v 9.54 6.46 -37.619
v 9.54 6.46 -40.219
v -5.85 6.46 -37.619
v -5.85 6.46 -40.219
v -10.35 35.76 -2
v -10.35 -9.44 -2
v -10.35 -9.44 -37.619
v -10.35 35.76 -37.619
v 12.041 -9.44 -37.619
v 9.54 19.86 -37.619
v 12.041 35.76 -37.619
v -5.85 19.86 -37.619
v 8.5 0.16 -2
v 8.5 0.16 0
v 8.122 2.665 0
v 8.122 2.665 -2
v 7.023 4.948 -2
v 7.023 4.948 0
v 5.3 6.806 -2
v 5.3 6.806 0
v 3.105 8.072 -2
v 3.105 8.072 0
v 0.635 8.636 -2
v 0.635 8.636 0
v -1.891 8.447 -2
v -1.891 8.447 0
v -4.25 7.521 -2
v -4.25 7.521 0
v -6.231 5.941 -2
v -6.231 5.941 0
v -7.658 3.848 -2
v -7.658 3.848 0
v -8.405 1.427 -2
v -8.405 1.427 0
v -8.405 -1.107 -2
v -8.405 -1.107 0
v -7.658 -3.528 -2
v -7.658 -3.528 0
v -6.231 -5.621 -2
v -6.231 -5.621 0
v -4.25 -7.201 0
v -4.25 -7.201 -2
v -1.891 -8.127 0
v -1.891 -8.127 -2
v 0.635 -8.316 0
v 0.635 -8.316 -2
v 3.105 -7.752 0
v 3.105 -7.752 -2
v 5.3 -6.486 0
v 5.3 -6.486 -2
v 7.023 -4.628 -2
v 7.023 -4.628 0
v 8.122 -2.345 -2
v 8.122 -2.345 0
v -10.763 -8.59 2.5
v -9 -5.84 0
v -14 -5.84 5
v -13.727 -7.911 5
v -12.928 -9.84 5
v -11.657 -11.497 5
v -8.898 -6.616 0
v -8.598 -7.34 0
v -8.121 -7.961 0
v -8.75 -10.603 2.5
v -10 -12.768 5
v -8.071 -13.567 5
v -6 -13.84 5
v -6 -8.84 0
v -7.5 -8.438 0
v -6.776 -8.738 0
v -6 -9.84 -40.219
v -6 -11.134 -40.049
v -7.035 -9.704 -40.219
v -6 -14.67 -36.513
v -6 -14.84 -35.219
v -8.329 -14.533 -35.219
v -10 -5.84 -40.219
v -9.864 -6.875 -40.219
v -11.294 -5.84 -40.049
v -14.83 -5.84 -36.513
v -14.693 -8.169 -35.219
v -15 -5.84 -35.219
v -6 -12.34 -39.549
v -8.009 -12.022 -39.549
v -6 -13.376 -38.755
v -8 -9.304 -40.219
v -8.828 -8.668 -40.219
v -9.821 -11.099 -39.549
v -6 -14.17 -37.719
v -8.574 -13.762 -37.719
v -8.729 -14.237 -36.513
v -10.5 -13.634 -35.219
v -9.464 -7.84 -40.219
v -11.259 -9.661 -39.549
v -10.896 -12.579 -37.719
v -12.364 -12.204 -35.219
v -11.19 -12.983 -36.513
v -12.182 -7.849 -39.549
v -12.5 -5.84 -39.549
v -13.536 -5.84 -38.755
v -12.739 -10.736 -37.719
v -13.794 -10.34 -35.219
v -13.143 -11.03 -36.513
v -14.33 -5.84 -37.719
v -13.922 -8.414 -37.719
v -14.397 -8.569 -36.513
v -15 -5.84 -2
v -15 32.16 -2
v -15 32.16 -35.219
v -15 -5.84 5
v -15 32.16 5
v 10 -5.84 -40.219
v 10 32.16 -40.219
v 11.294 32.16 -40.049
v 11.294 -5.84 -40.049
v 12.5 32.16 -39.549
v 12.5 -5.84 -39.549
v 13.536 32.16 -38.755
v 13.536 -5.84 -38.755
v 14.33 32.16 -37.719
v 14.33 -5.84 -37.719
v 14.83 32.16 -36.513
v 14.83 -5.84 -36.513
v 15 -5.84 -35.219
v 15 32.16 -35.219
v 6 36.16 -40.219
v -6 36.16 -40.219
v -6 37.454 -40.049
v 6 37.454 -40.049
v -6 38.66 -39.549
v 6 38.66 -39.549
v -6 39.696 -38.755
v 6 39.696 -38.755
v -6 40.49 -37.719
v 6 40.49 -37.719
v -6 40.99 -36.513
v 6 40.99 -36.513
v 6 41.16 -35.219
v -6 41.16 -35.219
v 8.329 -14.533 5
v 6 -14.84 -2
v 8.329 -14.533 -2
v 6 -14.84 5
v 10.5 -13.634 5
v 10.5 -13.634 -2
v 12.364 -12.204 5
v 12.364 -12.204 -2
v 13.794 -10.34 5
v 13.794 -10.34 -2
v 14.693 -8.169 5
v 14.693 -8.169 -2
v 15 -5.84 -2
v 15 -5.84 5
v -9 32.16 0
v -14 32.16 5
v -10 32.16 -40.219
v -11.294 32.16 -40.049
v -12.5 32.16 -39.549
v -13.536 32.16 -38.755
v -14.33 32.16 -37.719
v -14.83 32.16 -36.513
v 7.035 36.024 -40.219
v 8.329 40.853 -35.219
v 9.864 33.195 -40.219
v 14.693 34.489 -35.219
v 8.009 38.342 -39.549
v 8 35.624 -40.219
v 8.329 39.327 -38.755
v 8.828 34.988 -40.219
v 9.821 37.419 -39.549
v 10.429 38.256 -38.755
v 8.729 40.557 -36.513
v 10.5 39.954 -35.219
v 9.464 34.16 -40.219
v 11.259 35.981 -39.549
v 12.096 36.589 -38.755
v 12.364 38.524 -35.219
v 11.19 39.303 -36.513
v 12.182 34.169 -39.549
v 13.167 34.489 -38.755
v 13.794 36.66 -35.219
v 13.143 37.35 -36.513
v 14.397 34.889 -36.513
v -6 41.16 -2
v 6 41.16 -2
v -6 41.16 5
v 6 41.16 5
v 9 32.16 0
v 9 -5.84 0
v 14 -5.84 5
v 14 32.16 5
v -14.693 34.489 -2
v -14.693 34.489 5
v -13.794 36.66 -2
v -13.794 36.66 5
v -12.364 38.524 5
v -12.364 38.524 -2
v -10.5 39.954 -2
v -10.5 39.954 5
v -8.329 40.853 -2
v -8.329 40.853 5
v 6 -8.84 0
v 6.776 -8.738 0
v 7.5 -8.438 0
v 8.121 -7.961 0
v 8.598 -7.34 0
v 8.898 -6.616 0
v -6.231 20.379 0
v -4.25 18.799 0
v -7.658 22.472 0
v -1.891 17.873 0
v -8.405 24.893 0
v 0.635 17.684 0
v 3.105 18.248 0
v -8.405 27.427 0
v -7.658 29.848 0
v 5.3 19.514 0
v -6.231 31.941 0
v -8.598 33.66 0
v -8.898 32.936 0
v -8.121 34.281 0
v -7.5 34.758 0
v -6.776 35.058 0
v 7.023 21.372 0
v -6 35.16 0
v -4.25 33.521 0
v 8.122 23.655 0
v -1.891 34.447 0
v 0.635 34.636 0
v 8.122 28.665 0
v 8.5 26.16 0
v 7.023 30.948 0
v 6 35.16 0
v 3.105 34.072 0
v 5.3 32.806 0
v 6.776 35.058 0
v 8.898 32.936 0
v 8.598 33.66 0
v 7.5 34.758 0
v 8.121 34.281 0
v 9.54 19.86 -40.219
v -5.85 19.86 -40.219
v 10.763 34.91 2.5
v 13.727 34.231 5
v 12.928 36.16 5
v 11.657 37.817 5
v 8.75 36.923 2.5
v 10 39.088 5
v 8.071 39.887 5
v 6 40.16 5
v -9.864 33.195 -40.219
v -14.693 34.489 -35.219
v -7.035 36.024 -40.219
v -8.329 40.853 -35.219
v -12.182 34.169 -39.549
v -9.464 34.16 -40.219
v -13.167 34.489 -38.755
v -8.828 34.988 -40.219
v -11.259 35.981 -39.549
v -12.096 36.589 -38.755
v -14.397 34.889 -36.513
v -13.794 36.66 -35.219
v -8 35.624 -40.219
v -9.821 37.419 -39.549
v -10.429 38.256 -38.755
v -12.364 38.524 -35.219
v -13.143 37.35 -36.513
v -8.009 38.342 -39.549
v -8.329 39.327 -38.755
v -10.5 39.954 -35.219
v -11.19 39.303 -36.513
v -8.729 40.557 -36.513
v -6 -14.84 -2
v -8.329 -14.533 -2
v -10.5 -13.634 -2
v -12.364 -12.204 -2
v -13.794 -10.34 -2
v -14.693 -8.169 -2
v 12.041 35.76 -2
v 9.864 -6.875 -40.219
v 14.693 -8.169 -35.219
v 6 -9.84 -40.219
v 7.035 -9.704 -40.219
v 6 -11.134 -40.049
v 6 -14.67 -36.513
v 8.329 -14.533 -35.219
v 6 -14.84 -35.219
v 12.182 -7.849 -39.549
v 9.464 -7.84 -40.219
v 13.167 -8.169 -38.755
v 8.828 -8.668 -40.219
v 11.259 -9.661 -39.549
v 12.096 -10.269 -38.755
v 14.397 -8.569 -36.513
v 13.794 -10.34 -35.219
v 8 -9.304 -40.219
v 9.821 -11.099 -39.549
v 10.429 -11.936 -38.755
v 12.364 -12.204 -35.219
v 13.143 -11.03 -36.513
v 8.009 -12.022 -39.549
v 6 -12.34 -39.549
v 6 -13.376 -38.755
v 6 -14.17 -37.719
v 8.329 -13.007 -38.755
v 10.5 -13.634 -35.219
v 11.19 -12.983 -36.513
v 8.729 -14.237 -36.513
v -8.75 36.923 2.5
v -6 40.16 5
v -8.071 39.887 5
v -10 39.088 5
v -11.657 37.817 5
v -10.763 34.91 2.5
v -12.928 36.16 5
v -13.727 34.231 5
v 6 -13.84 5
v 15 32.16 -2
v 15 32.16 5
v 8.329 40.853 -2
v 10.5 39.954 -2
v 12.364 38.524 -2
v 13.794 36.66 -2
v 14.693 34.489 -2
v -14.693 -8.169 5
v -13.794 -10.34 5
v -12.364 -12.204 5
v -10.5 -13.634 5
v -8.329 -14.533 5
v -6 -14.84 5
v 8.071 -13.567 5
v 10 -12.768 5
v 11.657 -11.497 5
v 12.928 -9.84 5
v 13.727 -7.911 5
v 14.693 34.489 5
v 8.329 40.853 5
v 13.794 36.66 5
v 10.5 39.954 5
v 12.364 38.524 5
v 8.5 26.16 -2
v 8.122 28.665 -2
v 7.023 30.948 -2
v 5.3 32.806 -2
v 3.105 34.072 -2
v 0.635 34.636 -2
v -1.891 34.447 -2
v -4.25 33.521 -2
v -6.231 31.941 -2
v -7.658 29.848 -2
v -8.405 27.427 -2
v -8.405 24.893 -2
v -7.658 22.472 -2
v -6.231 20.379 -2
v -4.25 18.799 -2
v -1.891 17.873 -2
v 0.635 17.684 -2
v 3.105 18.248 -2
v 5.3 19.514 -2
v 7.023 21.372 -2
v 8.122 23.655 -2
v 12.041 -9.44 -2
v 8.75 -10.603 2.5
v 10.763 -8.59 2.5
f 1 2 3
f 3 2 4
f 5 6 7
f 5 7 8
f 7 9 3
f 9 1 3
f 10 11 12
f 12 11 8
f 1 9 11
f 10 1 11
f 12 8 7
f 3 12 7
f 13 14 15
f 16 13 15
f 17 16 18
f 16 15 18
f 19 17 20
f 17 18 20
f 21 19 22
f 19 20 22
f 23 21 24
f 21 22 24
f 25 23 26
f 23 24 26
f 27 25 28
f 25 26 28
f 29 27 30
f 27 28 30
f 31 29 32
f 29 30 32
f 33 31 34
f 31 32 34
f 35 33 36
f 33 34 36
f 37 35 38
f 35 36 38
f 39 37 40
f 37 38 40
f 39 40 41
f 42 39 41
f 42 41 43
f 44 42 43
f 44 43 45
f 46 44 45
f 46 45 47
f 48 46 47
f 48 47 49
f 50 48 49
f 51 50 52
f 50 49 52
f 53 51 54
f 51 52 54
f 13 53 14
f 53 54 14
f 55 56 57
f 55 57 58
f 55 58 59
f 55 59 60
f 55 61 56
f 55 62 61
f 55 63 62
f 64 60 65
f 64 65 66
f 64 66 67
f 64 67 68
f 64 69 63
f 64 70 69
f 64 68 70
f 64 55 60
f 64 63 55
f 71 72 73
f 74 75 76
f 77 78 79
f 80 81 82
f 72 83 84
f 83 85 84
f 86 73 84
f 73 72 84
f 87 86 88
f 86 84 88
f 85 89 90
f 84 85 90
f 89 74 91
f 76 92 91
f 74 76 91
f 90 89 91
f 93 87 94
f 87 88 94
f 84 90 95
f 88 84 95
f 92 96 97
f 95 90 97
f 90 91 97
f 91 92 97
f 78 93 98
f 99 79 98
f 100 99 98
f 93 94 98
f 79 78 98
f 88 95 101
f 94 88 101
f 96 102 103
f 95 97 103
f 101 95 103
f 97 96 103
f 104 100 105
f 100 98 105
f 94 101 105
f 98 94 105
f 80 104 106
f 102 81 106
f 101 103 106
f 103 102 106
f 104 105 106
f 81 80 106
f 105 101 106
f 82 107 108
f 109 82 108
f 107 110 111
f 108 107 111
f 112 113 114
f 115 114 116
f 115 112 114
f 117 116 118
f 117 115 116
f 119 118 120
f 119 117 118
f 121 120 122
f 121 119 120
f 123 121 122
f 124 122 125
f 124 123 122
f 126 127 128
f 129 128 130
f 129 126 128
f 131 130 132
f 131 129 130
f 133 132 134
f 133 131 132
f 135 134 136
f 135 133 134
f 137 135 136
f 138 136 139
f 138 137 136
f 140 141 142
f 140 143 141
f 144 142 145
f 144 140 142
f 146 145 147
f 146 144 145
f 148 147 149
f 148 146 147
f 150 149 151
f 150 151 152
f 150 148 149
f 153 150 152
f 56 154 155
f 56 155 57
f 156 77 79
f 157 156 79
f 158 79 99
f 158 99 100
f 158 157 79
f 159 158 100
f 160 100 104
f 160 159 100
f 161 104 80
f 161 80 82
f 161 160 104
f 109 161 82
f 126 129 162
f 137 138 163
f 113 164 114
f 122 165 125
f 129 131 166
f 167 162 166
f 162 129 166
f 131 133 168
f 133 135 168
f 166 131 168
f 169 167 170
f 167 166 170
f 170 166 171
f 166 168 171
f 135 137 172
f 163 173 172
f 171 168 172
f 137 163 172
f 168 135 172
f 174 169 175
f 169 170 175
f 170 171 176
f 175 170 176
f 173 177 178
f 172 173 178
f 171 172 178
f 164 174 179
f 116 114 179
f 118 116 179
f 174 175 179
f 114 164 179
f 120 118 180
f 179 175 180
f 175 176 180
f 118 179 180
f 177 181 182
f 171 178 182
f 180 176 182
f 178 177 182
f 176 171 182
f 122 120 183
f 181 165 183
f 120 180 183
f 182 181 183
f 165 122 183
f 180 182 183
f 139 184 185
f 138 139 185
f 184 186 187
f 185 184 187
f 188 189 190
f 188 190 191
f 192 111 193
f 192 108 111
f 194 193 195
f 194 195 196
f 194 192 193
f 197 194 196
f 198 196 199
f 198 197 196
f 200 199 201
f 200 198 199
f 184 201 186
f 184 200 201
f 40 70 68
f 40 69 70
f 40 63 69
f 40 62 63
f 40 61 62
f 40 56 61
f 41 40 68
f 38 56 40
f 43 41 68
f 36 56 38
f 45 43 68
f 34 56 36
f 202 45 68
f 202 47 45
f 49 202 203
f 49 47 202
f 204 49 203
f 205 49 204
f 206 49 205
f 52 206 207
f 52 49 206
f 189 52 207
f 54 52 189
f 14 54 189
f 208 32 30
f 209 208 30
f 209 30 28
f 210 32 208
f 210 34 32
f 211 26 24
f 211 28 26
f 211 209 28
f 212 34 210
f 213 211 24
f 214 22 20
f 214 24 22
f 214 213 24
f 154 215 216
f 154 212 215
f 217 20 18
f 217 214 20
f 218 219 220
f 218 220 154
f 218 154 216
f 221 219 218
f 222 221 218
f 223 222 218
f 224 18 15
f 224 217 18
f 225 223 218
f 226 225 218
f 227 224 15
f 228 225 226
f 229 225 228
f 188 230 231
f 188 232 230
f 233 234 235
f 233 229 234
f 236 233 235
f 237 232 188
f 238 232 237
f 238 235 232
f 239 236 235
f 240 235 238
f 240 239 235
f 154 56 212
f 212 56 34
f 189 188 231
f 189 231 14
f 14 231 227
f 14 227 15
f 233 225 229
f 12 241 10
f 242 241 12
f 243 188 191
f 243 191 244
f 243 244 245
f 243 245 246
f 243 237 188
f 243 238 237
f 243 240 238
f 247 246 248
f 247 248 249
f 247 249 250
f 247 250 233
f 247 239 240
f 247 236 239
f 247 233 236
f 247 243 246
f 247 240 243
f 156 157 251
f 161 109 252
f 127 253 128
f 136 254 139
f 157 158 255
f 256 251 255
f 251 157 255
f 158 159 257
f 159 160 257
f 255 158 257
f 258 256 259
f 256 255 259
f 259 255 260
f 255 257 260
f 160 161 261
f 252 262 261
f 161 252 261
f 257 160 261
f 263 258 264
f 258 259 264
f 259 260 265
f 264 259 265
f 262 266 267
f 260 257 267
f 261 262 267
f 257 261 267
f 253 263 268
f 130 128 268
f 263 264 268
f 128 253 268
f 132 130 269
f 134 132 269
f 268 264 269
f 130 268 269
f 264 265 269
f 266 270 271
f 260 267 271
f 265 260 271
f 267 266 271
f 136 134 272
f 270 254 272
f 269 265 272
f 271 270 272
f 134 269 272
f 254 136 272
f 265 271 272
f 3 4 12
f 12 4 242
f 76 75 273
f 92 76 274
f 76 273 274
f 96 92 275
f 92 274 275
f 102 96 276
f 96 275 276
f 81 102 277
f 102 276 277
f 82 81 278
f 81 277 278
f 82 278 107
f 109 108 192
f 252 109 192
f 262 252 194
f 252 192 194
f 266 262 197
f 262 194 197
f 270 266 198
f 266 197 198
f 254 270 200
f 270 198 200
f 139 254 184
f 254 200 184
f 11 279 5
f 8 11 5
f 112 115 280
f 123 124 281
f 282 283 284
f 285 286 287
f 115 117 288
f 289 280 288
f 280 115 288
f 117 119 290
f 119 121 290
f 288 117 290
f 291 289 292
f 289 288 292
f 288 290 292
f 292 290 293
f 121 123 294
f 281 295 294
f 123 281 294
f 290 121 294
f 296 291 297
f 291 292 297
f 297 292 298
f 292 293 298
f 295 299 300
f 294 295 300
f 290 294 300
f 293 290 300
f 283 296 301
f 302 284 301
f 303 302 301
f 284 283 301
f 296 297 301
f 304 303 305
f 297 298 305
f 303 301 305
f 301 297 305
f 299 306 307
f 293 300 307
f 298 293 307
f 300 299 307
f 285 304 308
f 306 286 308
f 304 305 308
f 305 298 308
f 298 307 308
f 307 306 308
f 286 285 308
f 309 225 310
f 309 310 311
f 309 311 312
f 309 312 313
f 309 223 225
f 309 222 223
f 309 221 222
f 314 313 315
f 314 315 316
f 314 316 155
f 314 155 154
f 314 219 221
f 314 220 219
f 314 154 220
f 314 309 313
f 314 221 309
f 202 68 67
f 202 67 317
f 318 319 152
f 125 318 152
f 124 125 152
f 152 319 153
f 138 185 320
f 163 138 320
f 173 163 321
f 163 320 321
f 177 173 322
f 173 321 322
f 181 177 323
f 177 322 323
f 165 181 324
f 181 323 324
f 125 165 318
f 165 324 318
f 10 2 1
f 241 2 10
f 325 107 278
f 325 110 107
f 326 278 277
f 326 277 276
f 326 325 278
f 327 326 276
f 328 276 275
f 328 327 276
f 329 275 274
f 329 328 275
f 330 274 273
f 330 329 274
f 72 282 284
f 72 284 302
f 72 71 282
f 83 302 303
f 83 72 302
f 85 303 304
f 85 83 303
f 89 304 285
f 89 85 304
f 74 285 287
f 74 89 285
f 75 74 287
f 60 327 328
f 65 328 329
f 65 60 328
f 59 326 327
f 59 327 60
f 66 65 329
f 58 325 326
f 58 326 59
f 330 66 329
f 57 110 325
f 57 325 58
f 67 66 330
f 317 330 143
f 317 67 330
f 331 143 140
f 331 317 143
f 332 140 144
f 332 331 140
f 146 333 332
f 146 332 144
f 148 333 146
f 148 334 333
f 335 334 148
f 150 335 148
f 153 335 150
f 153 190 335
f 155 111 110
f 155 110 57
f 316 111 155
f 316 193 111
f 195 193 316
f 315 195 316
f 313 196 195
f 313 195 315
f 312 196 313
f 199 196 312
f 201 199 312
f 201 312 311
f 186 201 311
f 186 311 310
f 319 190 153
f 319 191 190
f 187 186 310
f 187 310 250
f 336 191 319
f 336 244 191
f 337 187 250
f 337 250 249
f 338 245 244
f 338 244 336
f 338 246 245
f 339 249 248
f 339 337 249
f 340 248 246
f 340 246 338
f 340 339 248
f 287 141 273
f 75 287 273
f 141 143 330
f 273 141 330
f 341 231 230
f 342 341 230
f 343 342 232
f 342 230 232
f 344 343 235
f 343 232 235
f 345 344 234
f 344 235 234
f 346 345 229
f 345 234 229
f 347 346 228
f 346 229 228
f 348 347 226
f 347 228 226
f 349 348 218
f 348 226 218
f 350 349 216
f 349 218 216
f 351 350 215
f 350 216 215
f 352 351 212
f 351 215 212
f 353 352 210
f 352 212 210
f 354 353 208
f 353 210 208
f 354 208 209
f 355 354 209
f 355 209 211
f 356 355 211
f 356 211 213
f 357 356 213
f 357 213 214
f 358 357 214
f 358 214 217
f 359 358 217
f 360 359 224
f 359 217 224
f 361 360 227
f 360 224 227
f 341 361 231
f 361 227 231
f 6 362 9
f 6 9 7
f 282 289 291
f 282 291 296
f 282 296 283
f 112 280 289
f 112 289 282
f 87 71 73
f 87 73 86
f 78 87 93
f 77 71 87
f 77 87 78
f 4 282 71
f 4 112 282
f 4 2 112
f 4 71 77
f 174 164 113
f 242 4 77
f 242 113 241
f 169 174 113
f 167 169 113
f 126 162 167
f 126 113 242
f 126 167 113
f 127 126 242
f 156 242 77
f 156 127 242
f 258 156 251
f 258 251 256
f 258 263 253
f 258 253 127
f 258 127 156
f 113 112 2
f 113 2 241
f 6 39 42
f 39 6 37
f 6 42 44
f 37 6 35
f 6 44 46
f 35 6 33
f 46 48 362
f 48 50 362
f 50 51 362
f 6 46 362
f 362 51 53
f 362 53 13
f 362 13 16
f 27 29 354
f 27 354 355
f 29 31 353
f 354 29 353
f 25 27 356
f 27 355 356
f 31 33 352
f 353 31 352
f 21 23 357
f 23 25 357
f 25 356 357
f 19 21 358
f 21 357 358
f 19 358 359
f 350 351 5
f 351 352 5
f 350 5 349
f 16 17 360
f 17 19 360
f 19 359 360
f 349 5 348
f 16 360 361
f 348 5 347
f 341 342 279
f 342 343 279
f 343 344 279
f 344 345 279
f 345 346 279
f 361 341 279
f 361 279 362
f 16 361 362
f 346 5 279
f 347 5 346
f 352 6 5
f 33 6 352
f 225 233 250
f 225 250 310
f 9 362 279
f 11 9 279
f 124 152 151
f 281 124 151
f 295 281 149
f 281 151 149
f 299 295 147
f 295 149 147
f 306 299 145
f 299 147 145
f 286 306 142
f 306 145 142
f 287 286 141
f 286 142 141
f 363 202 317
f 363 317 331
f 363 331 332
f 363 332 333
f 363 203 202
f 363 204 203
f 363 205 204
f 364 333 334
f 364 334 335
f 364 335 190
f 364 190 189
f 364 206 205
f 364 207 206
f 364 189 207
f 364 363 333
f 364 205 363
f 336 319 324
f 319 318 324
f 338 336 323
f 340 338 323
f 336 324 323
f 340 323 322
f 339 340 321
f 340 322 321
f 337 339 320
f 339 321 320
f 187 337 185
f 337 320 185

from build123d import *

# Parameters (mm, degrees)
SKETCH1_W           = 30
SKETCH1_H           = 56
SKETCH1_W_2         = 18
SKETCH1_H_2         = 51
SKETCH1_R           = 8.5
BOSS_EXTRUDE1_DEPTH = 2
SKETCH2_W           = 30
SKETCH2_H           = 56
SKETCH2_W_2         = 18
SKETCH2_H_2         = 44
BOSS_EXTRUDE2_DEPTH = 5
FILLET1_R           = 9
FILLET3_R           = 3
CHAMFER3_SIZE       = 5
SKETCH4_W           = 22.39143934
SKETCH4_H           = 45.199999578
BOSS_EXTRUDE3_DEPTH = 38.218999496
SKETCH5_W           = 15.39
SKETCH5_H           = 13.400000422
BOSS_EXTRUDE4_DEPTH = 2.6
FILLET4_R           = 5


with BuildPart() as part:
    # Sketch1 → Boss-Extrude1 (new body)
    # profile 1 of 2: a face of its own
    with BuildSketch(Plane.XY):
        with Locations((1.276e-06, 13.160000211)):
            Rectangle(SKETCH1_W, SKETCH1_H)
        with Locations((1.276e-06, 13.160000211)):
            Rectangle(SKETCH1_W_2, SKETCH1_H_2, mode=Mode.SUBTRACT)
    # profile 2 of 2: a face of its own
    with BuildSketch(Plane.XY):
        with Locations((1.276e-06, 13.160000211)):
            Rectangle(SKETCH1_W_2, SKETCH1_H_2)
        with Locations((1.276e-06, 26.160000211)):
            Circle(SKETCH1_R, mode=Mode.SUBTRACT)
        with Locations((1.276e-06, 0.160000211)):
            Circle(SKETCH1_R, mode=Mode.SUBTRACT)
    extrude(amount=-BOSS_EXTRUDE1_DEPTH)

    # Sketch2 → Boss-Extrude2 (add)
    with BuildSketch(Plane.XY):
        with Locations((1.276e-06, 13.160000211)):
            Rectangle(SKETCH2_W, SKETCH2_H)
        with Locations((1.276e-06, 13.160000211)):
            Rectangle(SKETCH2_W_2, SKETCH2_H_2, mode=Mode.SUBTRACT)
    extrude(amount=BOSS_EXTRUDE2_DEPTH)

    # Fillet1
    fillet1_edges = [part.edges().sort_by_distance(p)[0] for p in [
        (-14.999998724, -14.839999789, 1.5),
        (-14.999998724, 41.160000211, 1.5),
        (15.000001276, 41.160000211, 1.5),
        (15.000001276, -14.839999789, 1.5),
    ]]
    fillet(fillet1_edges, radius=FILLET1_R)

    # Fillet3
    fillet3_edges = [part.edges().sort_by_distance(p)[0] for p in [
        (-8.999998724, -8.839999789, 2.5),
        (9.000001276, -8.839999789, 2.5),
        (9.000001276, 35.160000211, 2.5),
        (-8.999998724, 35.160000211, 2.5),
    ]]
    fillet(fillet3_edges, radius=FILLET3_R)

    # Chamfer3
    chamfer3_edges = [part.edges().sort_by_distance(p)[0] for p in [
        (9.000001276, 13.160000211, 5),
        (8.121321619, 34.281320554, 5),
        (8.121321619, -7.961320133, 5),
        (-8.121319068, 34.281320554, 5),
        (-8.121319068, -7.961320133, 5),
        (-8.999998724, 13.160000211, 5),
        (1.276e-06, 35.160000211, 5),
        (1.276e-06, -8.839999789, 5),
    ]]
    chamfer(chamfer3_edges, length=CHAMFER3_SIZE - 0.0001)  # a hair under: the kernel refuses the full size

    # Sketch4 → Boss-Extrude3 (add)
    with BuildSketch(Plane(origin=(0, 0, -2), x_dir=(-1, 0, 0), z_dir=(0, 0, -1))):
        with BuildLine():
            Line((5.999998724, 41.160000211), (-6.000001276, 41.160000211))
            ThreePointArc((-6.000001276, 41.160000211), (-12.363962306, 38.523961242), (-15.000001276, 32.160000211))
            Line((-15.000001276, 32.160000211), (-15.000001276, -5.839999789))
            ThreePointArc((-15.000001276, -5.839999789), (-12.363962306, -12.20396082), (-6.000001276, -14.839999789))
            Line((-6.000001276, -14.839999789), (5.999998724, -14.839999789))
            ThreePointArc((5.999998724, -14.839999789), (12.363959755, -12.20396082), (14.999998724, -5.839999789))
            Line((14.999998724, -5.839999789), (14.999998724, 32.160000211))
            ThreePointArc((14.999998724, 32.160000211), (12.363959755, 38.523961242), (5.999998724, 41.160000211))
        make_face()
        with Locations((-0.84571967, 13.160000211)):
            Rectangle(SKETCH4_W, SKETCH4_H, mode=Mode.SUBTRACT)
    extrude(amount=BOSS_EXTRUDE3_DEPTH)

    # Sketch5 → Boss-Extrude4 (add)
    with BuildSketch(Plane(origin=(0, 0, -40.218999496), x_dir=(-1, 0, 0), z_dir=(0, 0, -1))):
        with BuildLine():
            Line((14.999998724, -5.839999789), (14.999998724, 32.160000211))
            ThreePointArc((14.999998724, 32.160000211), (12.363959755, 38.523961242), (5.999998724, 41.160000211))
            Line((5.999998724, 41.160000211), (-6.000001276, 41.160000211))
            ThreePointArc((-6.000001276, 41.160000211), (-12.363962306, 38.523961242), (-15.000001276, 32.160000211))
            Line((-15.000001276, 32.160000211), (-15.000001276, -5.839999789))
            ThreePointArc((-15.000001276, -5.839999789), (-12.363962306, -12.20396082), (-6.000001276, -14.839999789))
            Line((-6.000001276, -14.839999789), (5.999998724, -14.839999789))
            ThreePointArc((5.999998724, -14.839999789), (12.363959755, -12.20396082), (14.999998724, -5.839999789))
        make_face()
        with Locations((-1.845, 13.160000211)):
            Rectangle(SKETCH5_W, SKETCH5_H, mode=Mode.SUBTRACT)
    extrude(amount=-BOSS_EXTRUDE4_DEPTH)

    # Fillet4
    fillet4_edges = [part.edges().sort_by_distance(p)[0] for p in [
        (-14.999998724, 13.160000211, -40.218999496),
        (-12.363959755, 38.523961242, -40.218999496),
        (1.276e-06, 41.160000211, -40.218999496),
        (12.363962306, 38.523961242, -40.218999496),
        (15.000001276, 13.160000211, -40.218999496),
        (12.363962306, -12.20396082, -40.218999496),
        (1.276e-06, -14.839999789, -40.218999496),
        (-12.363959755, -12.20396082, -40.218999496),
    ]]
    fillet(fillet4_edges, radius=FILLET4_R)


solid = part.part
